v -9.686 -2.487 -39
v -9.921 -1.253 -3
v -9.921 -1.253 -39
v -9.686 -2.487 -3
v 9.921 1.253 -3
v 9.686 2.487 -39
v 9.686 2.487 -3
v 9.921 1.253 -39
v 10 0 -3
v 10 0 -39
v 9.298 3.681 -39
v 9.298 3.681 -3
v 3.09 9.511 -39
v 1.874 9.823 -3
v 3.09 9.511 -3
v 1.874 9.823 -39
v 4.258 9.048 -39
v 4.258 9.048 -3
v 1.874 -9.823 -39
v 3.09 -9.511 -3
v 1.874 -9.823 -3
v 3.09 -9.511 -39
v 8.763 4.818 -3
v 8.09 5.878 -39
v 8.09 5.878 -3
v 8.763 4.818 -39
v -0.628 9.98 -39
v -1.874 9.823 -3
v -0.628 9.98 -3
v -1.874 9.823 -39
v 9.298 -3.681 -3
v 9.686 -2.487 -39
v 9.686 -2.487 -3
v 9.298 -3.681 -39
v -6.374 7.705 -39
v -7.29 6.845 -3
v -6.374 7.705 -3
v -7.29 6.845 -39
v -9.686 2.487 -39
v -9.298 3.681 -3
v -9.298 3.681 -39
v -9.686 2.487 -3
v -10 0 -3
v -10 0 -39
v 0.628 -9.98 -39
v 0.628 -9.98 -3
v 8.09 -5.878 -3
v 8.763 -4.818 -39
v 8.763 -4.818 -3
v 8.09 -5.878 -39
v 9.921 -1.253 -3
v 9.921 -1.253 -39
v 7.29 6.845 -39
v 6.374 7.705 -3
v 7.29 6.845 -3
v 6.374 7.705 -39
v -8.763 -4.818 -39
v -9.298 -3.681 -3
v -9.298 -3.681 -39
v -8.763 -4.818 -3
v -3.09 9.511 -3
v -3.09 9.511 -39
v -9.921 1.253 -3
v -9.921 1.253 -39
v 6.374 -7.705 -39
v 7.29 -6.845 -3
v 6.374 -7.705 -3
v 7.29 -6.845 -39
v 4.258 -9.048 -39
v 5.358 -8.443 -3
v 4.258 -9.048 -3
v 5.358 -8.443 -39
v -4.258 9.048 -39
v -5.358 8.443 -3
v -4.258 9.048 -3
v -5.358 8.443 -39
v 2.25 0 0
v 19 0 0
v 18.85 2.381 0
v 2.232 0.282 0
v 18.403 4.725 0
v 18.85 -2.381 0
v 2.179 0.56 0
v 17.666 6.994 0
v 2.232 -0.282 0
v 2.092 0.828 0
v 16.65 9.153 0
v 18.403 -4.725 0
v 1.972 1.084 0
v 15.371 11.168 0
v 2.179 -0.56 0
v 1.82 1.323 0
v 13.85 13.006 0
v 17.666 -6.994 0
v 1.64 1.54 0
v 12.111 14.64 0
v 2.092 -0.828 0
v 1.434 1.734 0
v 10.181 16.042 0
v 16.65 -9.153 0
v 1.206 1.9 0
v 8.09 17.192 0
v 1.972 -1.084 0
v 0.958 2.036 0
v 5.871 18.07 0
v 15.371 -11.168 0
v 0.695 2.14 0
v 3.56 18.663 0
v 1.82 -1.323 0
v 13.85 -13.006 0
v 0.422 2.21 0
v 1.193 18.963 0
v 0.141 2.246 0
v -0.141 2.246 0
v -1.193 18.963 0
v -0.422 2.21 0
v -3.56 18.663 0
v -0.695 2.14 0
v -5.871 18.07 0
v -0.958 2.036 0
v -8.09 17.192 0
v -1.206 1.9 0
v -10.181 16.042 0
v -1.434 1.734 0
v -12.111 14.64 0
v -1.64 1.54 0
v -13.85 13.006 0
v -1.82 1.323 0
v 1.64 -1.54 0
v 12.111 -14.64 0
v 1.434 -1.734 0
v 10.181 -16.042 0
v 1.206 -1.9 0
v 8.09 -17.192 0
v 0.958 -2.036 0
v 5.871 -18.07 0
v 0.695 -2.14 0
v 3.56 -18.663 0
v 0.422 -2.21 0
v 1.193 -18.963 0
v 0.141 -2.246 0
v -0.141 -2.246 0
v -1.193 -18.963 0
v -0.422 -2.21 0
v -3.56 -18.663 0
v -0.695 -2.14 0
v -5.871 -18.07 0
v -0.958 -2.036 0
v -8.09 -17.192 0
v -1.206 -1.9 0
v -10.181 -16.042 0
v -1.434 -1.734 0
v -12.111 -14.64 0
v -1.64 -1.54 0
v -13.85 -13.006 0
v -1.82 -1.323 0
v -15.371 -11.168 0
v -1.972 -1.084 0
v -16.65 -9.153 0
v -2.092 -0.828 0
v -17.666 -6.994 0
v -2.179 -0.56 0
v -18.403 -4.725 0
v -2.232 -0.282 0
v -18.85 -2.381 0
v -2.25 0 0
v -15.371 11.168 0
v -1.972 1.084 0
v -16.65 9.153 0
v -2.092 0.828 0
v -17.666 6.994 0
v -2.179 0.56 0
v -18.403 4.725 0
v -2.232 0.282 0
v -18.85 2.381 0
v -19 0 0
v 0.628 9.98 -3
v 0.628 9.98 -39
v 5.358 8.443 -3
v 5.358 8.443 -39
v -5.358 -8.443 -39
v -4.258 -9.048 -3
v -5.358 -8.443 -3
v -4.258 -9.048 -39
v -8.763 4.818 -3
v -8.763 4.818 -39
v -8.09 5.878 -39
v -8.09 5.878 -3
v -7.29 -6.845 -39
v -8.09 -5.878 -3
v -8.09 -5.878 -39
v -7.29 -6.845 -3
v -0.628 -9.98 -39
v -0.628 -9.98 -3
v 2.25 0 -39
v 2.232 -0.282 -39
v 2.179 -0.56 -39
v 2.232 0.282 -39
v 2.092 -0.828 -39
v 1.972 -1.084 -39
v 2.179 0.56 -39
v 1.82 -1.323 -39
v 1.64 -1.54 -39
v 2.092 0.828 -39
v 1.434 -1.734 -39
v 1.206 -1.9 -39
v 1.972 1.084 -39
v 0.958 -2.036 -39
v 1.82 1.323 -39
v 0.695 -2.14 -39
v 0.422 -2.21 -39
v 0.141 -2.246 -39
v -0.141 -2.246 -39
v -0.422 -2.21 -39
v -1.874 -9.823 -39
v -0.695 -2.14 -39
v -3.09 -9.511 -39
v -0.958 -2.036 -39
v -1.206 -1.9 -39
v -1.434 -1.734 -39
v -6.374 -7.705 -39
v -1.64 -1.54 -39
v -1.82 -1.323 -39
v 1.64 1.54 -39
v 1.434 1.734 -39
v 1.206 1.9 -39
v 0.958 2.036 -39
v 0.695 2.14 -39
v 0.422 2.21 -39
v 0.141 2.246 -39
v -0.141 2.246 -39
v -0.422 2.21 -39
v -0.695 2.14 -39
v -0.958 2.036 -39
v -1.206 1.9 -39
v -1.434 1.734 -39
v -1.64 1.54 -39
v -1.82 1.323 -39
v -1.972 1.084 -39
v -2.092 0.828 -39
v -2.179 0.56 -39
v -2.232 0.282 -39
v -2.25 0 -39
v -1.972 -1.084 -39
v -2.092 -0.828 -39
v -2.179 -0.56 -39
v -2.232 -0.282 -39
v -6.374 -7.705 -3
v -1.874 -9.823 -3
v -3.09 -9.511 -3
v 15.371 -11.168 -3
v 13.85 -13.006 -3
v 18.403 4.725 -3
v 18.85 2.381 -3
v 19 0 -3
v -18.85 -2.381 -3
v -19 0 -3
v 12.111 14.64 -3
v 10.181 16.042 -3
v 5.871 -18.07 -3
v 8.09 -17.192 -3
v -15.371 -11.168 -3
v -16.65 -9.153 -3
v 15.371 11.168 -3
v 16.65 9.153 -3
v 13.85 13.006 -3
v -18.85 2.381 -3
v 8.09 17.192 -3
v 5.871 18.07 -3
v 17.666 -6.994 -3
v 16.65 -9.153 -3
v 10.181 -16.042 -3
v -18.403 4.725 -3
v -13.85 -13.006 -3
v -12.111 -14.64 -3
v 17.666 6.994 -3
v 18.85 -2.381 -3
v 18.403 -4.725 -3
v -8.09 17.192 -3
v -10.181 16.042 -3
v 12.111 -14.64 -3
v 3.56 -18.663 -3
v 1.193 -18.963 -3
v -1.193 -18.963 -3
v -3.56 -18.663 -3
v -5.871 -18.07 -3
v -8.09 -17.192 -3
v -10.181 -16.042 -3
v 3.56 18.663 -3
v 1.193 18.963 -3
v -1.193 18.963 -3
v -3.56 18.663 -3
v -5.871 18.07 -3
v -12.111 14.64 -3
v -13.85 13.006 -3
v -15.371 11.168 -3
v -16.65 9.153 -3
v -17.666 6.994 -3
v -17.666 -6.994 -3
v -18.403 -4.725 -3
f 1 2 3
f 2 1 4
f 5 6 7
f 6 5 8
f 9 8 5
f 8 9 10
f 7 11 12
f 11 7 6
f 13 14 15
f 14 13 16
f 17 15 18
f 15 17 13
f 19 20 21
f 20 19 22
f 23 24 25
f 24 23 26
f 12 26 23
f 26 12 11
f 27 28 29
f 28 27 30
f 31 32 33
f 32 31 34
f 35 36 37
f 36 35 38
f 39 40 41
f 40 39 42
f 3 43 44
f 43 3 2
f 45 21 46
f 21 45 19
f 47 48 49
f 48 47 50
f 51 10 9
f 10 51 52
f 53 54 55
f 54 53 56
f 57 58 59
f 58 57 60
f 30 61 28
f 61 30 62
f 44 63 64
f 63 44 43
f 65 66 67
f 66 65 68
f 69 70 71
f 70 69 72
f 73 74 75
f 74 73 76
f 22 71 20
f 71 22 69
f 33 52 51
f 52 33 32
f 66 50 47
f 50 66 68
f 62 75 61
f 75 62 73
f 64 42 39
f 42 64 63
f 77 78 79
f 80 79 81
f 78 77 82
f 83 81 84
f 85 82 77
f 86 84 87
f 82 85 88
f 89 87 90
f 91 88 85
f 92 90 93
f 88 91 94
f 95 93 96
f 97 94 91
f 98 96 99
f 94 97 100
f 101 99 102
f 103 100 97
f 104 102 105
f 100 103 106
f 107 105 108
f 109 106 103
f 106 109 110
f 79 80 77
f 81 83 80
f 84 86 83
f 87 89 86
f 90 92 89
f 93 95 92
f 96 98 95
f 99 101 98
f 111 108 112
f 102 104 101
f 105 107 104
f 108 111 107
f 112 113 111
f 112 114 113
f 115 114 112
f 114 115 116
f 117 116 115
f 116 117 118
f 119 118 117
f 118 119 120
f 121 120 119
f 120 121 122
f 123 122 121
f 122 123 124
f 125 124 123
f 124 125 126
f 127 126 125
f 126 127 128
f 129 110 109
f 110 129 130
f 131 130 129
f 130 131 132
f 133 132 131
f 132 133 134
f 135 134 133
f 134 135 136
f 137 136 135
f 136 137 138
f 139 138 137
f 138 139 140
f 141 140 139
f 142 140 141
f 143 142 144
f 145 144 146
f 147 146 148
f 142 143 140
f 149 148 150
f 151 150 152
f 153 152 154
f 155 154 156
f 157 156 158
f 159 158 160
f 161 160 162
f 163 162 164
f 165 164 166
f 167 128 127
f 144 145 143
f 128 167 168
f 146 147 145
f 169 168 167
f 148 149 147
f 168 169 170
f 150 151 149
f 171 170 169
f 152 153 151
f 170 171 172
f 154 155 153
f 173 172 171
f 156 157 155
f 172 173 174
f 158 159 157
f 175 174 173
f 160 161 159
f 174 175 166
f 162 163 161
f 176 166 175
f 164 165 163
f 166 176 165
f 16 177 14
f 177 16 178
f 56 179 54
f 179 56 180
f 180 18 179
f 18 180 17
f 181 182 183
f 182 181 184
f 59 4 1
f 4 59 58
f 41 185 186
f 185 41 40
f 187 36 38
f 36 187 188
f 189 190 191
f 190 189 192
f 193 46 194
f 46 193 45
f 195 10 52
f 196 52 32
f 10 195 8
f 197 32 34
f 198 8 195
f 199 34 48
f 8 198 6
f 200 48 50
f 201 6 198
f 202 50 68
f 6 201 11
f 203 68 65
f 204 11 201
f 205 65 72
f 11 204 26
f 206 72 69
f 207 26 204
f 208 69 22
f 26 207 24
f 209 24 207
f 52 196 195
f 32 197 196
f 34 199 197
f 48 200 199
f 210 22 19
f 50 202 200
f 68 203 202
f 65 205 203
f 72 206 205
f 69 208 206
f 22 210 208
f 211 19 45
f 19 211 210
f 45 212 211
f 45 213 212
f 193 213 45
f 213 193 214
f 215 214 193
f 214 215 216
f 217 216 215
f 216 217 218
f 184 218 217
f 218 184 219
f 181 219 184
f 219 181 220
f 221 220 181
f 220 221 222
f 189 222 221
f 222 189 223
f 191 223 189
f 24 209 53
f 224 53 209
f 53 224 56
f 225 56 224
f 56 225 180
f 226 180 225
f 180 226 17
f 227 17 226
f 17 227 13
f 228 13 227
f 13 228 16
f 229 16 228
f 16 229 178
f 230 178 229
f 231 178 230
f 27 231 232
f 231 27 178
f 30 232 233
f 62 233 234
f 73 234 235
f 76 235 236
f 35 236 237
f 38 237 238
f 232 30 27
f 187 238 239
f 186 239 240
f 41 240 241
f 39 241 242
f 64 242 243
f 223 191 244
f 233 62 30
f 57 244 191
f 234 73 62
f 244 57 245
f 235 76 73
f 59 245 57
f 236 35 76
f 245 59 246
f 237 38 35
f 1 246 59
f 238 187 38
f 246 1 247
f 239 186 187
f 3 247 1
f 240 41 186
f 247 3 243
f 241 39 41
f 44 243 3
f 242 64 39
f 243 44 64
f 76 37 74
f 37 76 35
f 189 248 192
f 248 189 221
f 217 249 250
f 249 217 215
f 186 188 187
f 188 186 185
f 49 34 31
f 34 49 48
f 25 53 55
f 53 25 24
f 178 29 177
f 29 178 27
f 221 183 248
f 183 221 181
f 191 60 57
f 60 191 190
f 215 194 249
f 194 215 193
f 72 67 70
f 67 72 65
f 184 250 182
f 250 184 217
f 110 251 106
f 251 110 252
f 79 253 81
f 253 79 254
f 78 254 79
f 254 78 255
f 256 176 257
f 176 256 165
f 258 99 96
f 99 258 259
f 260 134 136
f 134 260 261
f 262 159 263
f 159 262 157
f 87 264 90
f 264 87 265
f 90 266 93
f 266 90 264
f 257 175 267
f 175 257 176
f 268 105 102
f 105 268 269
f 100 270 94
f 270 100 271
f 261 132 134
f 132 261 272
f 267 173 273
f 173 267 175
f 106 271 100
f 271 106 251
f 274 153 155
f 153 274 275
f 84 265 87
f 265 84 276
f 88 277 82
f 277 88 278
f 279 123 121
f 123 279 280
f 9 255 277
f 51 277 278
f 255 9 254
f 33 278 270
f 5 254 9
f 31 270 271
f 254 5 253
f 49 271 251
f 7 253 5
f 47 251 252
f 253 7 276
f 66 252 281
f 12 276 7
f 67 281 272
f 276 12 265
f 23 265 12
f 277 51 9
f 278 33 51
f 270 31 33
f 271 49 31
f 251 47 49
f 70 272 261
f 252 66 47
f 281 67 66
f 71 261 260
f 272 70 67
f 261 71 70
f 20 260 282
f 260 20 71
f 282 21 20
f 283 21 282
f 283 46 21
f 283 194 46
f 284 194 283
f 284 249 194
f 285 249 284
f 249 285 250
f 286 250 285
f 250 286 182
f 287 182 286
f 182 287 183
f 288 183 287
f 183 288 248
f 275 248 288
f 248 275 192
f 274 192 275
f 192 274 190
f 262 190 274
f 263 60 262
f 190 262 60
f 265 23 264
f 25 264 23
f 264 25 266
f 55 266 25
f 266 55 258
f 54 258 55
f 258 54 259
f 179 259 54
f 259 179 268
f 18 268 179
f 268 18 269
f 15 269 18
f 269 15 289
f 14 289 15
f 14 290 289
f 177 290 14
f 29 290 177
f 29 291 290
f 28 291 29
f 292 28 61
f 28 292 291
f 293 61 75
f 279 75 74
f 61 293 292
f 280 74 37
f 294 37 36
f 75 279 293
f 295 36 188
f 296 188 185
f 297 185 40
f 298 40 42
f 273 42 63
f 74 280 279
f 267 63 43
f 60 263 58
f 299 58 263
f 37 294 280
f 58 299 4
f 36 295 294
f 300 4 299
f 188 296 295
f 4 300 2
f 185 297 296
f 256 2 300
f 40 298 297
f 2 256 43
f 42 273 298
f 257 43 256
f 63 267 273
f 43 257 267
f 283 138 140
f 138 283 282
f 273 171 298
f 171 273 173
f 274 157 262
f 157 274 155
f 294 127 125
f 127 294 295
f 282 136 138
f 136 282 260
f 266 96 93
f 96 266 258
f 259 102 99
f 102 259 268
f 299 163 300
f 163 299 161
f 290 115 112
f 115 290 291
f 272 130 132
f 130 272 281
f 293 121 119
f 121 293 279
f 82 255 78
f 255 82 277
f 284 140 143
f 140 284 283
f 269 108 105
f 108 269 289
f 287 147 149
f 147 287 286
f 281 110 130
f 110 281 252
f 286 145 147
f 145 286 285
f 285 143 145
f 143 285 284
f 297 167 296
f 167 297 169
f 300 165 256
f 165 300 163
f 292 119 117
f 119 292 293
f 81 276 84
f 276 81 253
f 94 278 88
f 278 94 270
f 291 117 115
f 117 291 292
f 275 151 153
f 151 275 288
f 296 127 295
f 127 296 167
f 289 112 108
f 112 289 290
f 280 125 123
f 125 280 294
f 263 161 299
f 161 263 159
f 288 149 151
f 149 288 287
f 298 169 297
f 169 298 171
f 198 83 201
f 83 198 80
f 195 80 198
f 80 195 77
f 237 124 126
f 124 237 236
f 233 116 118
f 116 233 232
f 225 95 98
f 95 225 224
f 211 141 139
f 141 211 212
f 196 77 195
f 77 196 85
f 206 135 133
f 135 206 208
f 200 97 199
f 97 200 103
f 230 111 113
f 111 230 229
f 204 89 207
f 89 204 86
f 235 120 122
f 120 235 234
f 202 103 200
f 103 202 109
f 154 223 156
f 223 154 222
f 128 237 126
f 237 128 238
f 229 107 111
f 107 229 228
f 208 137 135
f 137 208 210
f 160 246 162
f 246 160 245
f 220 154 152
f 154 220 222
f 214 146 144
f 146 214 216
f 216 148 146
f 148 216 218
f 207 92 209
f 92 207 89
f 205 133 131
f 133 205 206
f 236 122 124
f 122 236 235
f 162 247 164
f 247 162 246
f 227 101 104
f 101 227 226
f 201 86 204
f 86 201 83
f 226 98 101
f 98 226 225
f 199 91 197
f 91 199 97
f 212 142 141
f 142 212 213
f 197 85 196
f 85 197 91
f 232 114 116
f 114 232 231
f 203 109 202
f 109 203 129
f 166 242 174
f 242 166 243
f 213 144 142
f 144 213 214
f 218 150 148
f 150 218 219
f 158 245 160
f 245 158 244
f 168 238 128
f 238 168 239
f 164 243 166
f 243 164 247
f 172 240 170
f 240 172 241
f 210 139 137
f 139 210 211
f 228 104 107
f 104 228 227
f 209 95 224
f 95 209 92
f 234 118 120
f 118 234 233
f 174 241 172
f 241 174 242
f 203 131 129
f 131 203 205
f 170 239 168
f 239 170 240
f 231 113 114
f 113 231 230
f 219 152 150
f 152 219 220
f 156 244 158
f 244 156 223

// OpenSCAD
$fn = 50;


difference() {
	union() {
		translate(v = [0, 0, -39.0000000000]) {
			cylinder(h = 39, r = 10.0000000000);
		}
		translate(v = [0, 0, -3.0000000000]) {
			cylinder(h = 3, r = 19.0000000000);
		}
	}
	union() {
		#translate(v = [0, 0, -39]) {
			cylinder(h = 39, r = 2.2500000000);
		}
	}
}
